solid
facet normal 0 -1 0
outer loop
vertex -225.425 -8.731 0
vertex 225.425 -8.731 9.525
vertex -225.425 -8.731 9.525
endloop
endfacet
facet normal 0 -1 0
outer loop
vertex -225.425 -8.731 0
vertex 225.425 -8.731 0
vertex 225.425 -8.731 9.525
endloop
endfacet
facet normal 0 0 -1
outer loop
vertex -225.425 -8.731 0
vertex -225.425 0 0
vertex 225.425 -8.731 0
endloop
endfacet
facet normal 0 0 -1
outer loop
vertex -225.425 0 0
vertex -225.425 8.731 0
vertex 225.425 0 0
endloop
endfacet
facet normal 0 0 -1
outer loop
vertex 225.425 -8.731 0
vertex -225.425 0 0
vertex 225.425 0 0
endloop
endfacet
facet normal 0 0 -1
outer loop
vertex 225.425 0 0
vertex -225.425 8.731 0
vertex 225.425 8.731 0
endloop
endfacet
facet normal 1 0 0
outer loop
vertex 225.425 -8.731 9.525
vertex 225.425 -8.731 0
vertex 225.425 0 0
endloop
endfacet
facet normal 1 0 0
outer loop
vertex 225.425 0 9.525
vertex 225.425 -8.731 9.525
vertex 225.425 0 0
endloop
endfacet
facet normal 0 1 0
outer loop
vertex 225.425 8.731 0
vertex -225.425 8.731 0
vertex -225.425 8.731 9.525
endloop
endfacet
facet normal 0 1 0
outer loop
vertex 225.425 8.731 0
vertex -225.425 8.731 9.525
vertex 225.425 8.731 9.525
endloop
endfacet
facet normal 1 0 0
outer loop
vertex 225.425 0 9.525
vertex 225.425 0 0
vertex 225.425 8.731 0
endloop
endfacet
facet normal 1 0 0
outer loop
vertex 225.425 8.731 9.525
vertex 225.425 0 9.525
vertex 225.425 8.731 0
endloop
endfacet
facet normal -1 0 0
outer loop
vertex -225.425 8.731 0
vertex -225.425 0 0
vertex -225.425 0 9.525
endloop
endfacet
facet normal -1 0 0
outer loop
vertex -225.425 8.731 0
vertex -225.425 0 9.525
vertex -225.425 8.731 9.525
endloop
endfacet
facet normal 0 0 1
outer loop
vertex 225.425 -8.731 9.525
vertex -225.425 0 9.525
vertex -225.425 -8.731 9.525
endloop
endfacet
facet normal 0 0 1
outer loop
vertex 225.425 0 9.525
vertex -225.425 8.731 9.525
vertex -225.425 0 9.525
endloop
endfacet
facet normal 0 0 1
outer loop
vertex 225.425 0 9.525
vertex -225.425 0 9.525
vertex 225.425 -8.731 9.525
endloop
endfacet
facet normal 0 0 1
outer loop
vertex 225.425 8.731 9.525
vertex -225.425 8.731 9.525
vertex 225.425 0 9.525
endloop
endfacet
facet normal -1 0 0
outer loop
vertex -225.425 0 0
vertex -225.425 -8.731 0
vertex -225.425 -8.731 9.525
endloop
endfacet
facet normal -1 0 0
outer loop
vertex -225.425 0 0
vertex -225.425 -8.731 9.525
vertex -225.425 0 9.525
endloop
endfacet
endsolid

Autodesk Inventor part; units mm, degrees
ref_plane "YZ Plane" through (0, 0, 0) normal (1, 0, 0) x (0, 1, 0)
ref_plane "XZ Plane" through (0, 0, 0) normal (0, 1, 0) x (-1, 0, 0)
ref_plane "XY Plane" through (0, 0, 0) normal (0, 0, 1) x (1, 0, 0)
sketch "Sketch1" plane through (0, 0, 0) normal (0, 0, 1) x (1, 0, 0)
  line L0 (225.425, -8.7312) -> (-225.425, -8.7312)
  line L1 (-225.425, 8.7312) -> (225.425, 8.7312)
  line L2 (-225.425, -8.7312) -> (225.425, 8.7312) construction
  line L3 (0, 0) -> (0, 8.7313) construction
  line L4 (-225.425, -8.7312) -> (-225.425, 0)
  line L5 (-225.425, 0) -> (-225.425, 8.7312)
  line L6 (225.425, -8.7312) -> (225.425, 0)
  line L7 (225.425, 0) -> (225.425, 8.7312)
  dimension "d6" = 225.425
  dimension "d14" = 17.4625
extrude "Extrusion1" add sketch "Sketch1" along normal blind 9.525
properties part number "BASE_FRONT,BACK_TREBUCHET" material "Wood (Birch)"
